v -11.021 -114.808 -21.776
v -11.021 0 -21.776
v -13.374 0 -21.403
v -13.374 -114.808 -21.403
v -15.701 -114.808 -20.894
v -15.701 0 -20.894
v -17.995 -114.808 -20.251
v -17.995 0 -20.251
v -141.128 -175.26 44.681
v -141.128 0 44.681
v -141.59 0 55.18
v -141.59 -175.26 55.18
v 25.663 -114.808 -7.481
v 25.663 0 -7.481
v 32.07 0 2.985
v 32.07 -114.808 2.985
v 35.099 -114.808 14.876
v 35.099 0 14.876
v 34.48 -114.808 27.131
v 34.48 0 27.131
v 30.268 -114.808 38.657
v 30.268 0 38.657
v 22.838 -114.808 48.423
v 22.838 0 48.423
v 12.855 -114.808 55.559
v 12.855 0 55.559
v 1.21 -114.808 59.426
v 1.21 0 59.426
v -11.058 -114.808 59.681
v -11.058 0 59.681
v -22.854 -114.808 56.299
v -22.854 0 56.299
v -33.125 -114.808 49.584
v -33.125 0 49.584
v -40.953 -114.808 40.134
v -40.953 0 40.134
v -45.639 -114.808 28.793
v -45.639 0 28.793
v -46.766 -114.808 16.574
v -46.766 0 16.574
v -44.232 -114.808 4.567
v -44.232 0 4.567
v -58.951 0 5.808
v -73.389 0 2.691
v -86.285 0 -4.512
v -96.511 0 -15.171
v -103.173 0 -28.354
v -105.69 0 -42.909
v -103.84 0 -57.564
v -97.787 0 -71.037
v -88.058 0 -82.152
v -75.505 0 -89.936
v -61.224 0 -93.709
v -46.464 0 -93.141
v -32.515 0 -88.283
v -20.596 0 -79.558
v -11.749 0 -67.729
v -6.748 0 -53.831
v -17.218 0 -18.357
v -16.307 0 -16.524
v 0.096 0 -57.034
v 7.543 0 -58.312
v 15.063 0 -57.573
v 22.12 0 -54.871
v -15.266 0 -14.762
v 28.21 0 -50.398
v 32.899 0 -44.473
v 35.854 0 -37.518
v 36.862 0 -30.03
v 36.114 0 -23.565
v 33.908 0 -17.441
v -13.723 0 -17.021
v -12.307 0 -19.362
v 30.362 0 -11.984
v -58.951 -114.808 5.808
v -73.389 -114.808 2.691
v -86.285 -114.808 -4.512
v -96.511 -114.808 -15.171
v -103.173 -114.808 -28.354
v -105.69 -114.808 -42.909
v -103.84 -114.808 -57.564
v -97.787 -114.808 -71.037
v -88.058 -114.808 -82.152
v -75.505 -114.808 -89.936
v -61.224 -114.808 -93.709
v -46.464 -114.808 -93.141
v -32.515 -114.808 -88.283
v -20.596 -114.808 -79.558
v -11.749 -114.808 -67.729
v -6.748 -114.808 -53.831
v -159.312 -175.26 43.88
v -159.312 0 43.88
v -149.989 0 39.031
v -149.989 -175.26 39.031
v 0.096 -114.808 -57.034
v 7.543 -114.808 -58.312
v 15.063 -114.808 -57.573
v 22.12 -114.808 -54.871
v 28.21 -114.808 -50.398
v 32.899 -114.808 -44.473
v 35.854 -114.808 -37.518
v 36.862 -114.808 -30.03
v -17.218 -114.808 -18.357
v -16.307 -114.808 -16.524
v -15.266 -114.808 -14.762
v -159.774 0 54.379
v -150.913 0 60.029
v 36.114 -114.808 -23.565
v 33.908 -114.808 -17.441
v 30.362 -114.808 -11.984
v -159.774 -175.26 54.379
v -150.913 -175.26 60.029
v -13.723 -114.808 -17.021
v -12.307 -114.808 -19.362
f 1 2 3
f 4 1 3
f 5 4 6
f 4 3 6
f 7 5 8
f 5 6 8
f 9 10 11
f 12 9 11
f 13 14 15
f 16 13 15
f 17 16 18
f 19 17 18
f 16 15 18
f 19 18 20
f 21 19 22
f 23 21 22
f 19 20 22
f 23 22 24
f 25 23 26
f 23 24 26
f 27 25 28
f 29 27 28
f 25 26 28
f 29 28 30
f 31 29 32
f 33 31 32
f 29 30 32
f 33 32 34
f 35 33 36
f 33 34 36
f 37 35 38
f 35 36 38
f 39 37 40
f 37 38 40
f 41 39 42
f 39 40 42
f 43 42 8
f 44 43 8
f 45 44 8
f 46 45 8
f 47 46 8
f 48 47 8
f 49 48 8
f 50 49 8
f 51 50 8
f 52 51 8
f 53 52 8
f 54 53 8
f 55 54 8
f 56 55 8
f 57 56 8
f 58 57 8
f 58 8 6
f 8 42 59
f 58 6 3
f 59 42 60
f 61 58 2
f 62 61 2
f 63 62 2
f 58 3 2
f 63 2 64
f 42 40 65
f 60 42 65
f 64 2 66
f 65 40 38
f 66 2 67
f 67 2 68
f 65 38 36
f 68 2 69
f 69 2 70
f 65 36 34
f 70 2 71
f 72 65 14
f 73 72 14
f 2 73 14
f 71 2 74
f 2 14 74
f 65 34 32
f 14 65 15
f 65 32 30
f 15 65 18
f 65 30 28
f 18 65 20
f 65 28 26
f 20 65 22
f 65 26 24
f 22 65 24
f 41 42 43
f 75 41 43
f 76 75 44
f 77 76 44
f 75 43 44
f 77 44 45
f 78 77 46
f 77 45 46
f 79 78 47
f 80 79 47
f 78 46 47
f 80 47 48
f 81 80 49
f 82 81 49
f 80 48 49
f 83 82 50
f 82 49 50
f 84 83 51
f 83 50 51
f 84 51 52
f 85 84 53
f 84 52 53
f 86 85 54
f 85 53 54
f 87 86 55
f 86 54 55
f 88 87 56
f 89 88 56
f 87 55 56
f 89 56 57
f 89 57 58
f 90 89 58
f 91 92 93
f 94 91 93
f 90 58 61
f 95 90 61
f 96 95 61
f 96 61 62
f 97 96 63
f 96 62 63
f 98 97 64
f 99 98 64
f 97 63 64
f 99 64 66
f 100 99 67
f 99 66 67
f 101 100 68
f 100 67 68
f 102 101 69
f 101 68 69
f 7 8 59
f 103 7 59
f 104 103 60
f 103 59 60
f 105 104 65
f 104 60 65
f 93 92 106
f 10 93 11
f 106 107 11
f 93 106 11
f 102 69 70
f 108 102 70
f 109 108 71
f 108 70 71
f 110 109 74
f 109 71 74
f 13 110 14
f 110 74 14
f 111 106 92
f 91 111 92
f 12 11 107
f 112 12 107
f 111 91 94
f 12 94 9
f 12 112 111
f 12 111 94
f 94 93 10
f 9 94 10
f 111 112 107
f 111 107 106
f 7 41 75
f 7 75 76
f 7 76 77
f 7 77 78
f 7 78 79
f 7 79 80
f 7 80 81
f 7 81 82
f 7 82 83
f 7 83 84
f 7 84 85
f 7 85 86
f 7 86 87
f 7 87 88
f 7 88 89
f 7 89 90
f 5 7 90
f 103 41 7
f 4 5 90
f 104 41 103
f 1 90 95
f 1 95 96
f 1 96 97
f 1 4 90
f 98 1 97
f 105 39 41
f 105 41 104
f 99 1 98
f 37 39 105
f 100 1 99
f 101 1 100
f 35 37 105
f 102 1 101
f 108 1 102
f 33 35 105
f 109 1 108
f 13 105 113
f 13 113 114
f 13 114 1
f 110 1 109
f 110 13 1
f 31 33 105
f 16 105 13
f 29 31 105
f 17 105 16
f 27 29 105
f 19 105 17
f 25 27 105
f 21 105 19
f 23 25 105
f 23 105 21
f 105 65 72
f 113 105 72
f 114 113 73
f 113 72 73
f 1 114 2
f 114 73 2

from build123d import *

# Parameters (mm, degrees)
F1_DEPTH = 114.808
F3_DEPTH = 175.26


with BuildPart() as f1:
    # F0 (on Front) → F1 (new body)
    with BuildSketch(Plane.XZ):
        with BuildLine():
            ThreePointArc((25.6628487822, -7.4808111298), (32.8172024659, 4.885626696), (35.3022317211, 18.9546775073))
            ThreePointArc((35.3022317211, 18.9546775073), (-13.0768212072, 59.3674402536), (-44.2324815618, 4.567358293))
            ThreePointArc((-44.2324815618, 4.567358293), (-28.0105833553, -2.4918355408), (-15.2659029767, -14.7619341979))
            ThreePointArc((-15.2659029767, -14.7619341979), (3.6055698097, -2.1673233144), (25.6628487822, -7.4808111298))
        make_face()
        with BuildLine():
            ThreePointArc((-15.2659029767, -14.7619341979), (-28.0105833553, -2.4918355408), (-44.2324815618, 4.567358293))
            ThreePointArc((-44.2324815618, 4.567358293), (-33.9881943736, -10.8809466008), (-17.9946564633, -20.2512341736))
            ThreePointArc((-17.9946564633, -20.2512341736), (-16.7793493314, -17.4324810717), (-15.2659029767, -14.7619341979))
        make_face()
        with BuildLine():
            ThreePointArc((-17.9946564633, -20.2512341736), (-33.9881943736, -10.8809466008), (-44.2324815618, 4.567358293))
            ThreePointArc((-44.2324815618, 4.567358293), (-97.7867193033, -71.0372404865), (-6.7479680143, -53.8309189616))
            ThreePointArc((-6.7479680143, -53.8309189616), (-18.2726677918, -39.0175902767), (-17.9946564633, -20.2512341736))
        make_face()
        with BuildLine():
            ThreePointArc((36.8622799555, -30.0298947841), (33.9082472391, -17.4413242511), (25.6628487822, -7.4808111298))
            ThreePointArc((25.6628487822, -7.4808111298), (9.1457659897, -19.3109785443), (-11.0207481957, -21.7764583426))
            ThreePointArc((-11.0207481957, -21.7764583426), (-7.1086795164, -32.609081399), (-5.781140064, -44.0496951342))
            ThreePointArc((-5.781140064, -44.0496951342), (-6.0234345779, -48.9641405721), (-6.7479680143, -53.8309189616))
            ThreePointArc((-6.7479680143, -53.8309189616), (22.1197578366, -54.8711028862), (36.8622799555, -30.0298947841))
        make_face()
        with BuildLine():
            ThreePointArc((-11.0207481957, -21.7764583426), (9.1457659897, -19.3109785443), (25.6628487822, -7.4808111298))
            ThreePointArc((25.6628487822, -7.4808111298), (3.6055698097, -2.1673233144), (-15.2659029767, -14.7619341979))
            ThreePointArc((-15.2659029767, -14.7619341979), (-12.9991883072, -18.181965113), (-11.0207481957, -21.7764583426))
        make_face()
        with BuildLine():
            ThreePointArc((-11.0207481957, -21.7764583426), (-14.5409053643, -21.165663233), (-17.9946564633, -20.2512341736))
            ThreePointArc((-17.9946564633, -20.2512341736), (-18.2726677918, -39.0175902767), (-6.7479680143, -53.8309189616))
            ThreePointArc((-6.7479680143, -53.8309189616), (-6.0234345779, -48.9641405721), (-5.781140064, -44.0496951342))
            ThreePointArc((-5.781140064, -44.0496951342), (-7.1086795164, -32.609081399), (-11.0207481957, -21.7764583426))
        make_face()
    extrude(amount=F1_DEPTH)


with BuildPart() as f3:
    # F2 (on Front) → F3 (new body)
    with BuildSketch(Plane.XZ):
        Polygon((-149.9888761281, 39.031247435), (-141.1276297332, 44.6808758994), (-141.5897283079, 55.1797546189), (-150.9130732776, 60.0290048739), (-159.7743196725, 54.3793764094), (-159.3122210978, 43.8804976899), align=None)
    extrude(amount=F3_DEPTH)


solid = Compound([f1.part, f3.part])
